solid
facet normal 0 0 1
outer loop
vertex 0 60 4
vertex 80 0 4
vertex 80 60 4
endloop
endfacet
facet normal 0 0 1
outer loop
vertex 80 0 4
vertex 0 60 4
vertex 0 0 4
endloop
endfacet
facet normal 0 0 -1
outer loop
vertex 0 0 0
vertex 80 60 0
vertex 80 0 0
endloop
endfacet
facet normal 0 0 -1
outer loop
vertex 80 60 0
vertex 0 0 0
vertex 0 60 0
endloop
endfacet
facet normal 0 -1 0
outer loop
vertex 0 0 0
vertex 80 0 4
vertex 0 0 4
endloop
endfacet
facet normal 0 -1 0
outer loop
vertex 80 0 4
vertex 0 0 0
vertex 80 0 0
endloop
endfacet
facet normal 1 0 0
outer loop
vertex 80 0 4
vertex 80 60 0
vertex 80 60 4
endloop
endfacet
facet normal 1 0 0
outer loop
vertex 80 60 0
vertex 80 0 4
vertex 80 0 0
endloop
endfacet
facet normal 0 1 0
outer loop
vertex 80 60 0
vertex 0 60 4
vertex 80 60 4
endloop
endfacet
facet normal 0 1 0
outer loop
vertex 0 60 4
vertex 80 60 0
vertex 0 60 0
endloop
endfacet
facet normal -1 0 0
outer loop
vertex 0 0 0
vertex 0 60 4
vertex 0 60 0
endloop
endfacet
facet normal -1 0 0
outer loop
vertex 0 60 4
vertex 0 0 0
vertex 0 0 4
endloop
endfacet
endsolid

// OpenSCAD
// Preview clearance block pattern.
// Preview helpers show fit and service paths without becoming production geometry.

$fn = 32;

show_pcb = true;
show_zip_tie_path = true;
show_wire_bundle = true;
show_screw_access = true;

module production_body() {
    cube([80, 60, 4]);
}

module pcb_preview() {
    if (show_pcb)
        %color([0.1, 0.45, 1.0, 0.25])
            translate([10, 10, 8])
                cube([55, 40, 1.6]);
}

module zip_tie_path_preview() {
    if (show_zip_tie_path)
        %color([0.0, 0.8, 1.0, 0.35])
            translate([5, 20, 4.2])
                cube([4, 20, 1.4]);
}

module wire_bundle_preview() {
    if (show_wire_bundle)
        %color([1.0, 0.35, 0.0, 0.3])
            translate([7, 30, 12])
                rotate([90, 0, 0])
                    cylinder(h = 35, d = 5, center = true);
}

module screw_access_preview() {
    if (show_screw_access)
        %color([1.0, 1.0, 0.0, 0.25])
            translate([20, 20, 4])
                cylinder(h = 35, d = 8);
}

production_body();
pcb_preview();
zip_tie_path_preview();
wire_bundle_preview();
screw_access_preview();
